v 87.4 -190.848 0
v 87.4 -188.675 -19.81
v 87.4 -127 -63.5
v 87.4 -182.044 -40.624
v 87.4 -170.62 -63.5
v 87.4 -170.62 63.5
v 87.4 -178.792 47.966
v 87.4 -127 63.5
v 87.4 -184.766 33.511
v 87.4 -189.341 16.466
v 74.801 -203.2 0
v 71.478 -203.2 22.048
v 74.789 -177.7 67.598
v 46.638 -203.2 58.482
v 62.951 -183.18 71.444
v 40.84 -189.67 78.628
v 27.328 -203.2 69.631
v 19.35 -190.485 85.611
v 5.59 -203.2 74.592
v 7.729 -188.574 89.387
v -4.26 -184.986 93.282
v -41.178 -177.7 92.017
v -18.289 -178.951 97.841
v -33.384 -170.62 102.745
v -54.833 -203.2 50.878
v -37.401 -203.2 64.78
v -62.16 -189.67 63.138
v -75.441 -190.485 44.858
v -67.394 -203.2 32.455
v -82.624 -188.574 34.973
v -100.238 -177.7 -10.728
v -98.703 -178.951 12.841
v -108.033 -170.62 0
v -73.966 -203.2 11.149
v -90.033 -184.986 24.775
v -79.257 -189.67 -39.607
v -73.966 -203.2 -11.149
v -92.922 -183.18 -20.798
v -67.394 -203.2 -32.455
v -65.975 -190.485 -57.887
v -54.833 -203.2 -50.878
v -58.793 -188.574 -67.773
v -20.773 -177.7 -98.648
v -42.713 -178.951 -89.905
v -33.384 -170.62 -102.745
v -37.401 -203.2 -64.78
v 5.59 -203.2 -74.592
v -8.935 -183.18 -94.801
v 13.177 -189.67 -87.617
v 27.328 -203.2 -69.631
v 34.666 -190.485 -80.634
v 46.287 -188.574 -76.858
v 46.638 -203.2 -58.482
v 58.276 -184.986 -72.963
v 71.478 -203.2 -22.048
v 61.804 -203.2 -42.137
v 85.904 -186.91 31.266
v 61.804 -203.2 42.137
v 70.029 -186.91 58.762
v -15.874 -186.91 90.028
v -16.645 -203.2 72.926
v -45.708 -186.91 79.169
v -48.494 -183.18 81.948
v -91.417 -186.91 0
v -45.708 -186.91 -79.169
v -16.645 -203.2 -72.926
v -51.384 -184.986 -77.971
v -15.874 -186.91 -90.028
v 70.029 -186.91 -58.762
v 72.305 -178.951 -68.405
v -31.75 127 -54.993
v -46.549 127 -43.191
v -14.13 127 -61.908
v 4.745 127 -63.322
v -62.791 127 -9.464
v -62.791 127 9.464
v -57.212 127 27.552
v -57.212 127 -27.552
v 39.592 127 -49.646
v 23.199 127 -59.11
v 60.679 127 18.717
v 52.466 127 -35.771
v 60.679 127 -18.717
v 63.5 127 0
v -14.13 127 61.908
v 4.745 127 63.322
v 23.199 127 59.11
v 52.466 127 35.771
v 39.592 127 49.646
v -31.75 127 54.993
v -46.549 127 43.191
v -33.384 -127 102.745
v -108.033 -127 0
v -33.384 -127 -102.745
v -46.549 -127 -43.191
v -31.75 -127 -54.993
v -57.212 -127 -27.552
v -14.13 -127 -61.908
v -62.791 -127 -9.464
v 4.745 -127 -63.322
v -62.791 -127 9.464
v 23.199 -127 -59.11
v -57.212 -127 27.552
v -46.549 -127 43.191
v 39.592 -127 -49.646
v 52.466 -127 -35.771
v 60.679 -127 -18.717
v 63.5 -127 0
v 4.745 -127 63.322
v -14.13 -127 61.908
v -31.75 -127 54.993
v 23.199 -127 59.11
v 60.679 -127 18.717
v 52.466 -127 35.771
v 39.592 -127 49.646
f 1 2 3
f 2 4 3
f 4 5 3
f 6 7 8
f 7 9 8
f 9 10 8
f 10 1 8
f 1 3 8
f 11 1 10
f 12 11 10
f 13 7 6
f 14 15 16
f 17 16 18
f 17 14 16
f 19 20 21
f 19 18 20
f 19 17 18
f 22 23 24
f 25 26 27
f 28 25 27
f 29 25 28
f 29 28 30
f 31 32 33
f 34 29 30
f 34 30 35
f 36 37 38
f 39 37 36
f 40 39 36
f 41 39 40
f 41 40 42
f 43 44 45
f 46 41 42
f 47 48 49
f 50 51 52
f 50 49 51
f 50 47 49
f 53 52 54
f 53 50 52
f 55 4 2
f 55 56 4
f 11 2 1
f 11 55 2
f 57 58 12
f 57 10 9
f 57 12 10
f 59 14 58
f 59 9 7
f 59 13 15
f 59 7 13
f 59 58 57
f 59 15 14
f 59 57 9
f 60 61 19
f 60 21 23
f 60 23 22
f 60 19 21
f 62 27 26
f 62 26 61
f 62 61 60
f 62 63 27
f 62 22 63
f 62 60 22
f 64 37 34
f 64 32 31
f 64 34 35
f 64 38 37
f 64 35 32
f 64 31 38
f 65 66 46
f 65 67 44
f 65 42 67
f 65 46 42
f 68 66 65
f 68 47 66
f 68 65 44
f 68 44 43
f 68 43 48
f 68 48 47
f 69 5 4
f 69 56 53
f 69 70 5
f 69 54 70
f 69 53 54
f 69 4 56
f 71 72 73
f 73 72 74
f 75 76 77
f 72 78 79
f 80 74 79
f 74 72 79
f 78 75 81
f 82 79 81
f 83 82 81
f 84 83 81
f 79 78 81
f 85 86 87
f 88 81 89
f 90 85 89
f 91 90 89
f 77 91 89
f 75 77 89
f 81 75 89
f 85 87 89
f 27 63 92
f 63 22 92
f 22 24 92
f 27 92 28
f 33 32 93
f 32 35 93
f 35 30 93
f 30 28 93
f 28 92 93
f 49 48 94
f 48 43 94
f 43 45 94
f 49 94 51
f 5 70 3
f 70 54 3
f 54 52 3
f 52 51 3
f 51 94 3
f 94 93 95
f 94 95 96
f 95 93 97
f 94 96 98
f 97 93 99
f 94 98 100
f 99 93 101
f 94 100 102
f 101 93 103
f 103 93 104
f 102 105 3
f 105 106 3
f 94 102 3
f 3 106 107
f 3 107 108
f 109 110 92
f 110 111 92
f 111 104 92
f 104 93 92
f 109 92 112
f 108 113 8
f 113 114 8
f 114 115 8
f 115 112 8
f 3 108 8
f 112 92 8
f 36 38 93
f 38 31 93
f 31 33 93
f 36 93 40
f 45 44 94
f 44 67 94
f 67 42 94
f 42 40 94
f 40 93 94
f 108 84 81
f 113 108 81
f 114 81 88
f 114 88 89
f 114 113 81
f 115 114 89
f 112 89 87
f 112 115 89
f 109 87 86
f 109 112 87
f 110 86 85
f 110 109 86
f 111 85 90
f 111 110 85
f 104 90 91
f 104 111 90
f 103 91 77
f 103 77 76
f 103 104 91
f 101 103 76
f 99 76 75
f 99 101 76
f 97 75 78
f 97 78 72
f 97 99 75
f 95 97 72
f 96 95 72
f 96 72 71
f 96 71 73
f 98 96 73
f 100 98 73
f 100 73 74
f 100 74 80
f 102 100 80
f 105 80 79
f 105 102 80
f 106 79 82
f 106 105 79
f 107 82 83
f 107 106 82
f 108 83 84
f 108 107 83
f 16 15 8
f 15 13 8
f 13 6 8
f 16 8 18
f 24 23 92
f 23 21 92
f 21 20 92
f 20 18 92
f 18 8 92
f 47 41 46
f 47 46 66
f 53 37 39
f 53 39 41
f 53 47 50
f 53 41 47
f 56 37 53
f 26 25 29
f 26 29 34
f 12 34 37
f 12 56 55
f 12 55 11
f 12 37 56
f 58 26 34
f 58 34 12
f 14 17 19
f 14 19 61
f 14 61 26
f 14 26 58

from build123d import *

# Parameters (mm, degrees)
F0_R     = 63.5
F1_DEPTH = 127
F3_DEPTH = 76.2


with BuildPart() as f1:
    # F0 (on Front) → F1 (new body, symmetric)
    with BuildSketch(Plane.XZ):
        Circle(F0_R)
    extrude(amount=F1_DEPTH, both=True)

    # F2 (on face) → F3 (join)
    with BuildSketch(Plane.XZ.offset(127)):
        Polygon((87.400252, -63.5), (87.400252, 63.5), (-33.383926, 102.745158), (-108.032653, 0), (-33.383926, -102.745158), align=None)
    extrude(amount=F3_DEPTH)

    # F4 (on Top) → F5 (revolve, cut)
    with BuildSketch(Plane.XY):
        Polygon((178.573892, -101.46219), (66.709772, -211.132884), (178.573892, -339.390486), align=None)
    revolve(axis=Axis((0, -117.441341, 0), (0, -1, 0)), mode=Mode.SUBTRACT)


solid = f1.part
